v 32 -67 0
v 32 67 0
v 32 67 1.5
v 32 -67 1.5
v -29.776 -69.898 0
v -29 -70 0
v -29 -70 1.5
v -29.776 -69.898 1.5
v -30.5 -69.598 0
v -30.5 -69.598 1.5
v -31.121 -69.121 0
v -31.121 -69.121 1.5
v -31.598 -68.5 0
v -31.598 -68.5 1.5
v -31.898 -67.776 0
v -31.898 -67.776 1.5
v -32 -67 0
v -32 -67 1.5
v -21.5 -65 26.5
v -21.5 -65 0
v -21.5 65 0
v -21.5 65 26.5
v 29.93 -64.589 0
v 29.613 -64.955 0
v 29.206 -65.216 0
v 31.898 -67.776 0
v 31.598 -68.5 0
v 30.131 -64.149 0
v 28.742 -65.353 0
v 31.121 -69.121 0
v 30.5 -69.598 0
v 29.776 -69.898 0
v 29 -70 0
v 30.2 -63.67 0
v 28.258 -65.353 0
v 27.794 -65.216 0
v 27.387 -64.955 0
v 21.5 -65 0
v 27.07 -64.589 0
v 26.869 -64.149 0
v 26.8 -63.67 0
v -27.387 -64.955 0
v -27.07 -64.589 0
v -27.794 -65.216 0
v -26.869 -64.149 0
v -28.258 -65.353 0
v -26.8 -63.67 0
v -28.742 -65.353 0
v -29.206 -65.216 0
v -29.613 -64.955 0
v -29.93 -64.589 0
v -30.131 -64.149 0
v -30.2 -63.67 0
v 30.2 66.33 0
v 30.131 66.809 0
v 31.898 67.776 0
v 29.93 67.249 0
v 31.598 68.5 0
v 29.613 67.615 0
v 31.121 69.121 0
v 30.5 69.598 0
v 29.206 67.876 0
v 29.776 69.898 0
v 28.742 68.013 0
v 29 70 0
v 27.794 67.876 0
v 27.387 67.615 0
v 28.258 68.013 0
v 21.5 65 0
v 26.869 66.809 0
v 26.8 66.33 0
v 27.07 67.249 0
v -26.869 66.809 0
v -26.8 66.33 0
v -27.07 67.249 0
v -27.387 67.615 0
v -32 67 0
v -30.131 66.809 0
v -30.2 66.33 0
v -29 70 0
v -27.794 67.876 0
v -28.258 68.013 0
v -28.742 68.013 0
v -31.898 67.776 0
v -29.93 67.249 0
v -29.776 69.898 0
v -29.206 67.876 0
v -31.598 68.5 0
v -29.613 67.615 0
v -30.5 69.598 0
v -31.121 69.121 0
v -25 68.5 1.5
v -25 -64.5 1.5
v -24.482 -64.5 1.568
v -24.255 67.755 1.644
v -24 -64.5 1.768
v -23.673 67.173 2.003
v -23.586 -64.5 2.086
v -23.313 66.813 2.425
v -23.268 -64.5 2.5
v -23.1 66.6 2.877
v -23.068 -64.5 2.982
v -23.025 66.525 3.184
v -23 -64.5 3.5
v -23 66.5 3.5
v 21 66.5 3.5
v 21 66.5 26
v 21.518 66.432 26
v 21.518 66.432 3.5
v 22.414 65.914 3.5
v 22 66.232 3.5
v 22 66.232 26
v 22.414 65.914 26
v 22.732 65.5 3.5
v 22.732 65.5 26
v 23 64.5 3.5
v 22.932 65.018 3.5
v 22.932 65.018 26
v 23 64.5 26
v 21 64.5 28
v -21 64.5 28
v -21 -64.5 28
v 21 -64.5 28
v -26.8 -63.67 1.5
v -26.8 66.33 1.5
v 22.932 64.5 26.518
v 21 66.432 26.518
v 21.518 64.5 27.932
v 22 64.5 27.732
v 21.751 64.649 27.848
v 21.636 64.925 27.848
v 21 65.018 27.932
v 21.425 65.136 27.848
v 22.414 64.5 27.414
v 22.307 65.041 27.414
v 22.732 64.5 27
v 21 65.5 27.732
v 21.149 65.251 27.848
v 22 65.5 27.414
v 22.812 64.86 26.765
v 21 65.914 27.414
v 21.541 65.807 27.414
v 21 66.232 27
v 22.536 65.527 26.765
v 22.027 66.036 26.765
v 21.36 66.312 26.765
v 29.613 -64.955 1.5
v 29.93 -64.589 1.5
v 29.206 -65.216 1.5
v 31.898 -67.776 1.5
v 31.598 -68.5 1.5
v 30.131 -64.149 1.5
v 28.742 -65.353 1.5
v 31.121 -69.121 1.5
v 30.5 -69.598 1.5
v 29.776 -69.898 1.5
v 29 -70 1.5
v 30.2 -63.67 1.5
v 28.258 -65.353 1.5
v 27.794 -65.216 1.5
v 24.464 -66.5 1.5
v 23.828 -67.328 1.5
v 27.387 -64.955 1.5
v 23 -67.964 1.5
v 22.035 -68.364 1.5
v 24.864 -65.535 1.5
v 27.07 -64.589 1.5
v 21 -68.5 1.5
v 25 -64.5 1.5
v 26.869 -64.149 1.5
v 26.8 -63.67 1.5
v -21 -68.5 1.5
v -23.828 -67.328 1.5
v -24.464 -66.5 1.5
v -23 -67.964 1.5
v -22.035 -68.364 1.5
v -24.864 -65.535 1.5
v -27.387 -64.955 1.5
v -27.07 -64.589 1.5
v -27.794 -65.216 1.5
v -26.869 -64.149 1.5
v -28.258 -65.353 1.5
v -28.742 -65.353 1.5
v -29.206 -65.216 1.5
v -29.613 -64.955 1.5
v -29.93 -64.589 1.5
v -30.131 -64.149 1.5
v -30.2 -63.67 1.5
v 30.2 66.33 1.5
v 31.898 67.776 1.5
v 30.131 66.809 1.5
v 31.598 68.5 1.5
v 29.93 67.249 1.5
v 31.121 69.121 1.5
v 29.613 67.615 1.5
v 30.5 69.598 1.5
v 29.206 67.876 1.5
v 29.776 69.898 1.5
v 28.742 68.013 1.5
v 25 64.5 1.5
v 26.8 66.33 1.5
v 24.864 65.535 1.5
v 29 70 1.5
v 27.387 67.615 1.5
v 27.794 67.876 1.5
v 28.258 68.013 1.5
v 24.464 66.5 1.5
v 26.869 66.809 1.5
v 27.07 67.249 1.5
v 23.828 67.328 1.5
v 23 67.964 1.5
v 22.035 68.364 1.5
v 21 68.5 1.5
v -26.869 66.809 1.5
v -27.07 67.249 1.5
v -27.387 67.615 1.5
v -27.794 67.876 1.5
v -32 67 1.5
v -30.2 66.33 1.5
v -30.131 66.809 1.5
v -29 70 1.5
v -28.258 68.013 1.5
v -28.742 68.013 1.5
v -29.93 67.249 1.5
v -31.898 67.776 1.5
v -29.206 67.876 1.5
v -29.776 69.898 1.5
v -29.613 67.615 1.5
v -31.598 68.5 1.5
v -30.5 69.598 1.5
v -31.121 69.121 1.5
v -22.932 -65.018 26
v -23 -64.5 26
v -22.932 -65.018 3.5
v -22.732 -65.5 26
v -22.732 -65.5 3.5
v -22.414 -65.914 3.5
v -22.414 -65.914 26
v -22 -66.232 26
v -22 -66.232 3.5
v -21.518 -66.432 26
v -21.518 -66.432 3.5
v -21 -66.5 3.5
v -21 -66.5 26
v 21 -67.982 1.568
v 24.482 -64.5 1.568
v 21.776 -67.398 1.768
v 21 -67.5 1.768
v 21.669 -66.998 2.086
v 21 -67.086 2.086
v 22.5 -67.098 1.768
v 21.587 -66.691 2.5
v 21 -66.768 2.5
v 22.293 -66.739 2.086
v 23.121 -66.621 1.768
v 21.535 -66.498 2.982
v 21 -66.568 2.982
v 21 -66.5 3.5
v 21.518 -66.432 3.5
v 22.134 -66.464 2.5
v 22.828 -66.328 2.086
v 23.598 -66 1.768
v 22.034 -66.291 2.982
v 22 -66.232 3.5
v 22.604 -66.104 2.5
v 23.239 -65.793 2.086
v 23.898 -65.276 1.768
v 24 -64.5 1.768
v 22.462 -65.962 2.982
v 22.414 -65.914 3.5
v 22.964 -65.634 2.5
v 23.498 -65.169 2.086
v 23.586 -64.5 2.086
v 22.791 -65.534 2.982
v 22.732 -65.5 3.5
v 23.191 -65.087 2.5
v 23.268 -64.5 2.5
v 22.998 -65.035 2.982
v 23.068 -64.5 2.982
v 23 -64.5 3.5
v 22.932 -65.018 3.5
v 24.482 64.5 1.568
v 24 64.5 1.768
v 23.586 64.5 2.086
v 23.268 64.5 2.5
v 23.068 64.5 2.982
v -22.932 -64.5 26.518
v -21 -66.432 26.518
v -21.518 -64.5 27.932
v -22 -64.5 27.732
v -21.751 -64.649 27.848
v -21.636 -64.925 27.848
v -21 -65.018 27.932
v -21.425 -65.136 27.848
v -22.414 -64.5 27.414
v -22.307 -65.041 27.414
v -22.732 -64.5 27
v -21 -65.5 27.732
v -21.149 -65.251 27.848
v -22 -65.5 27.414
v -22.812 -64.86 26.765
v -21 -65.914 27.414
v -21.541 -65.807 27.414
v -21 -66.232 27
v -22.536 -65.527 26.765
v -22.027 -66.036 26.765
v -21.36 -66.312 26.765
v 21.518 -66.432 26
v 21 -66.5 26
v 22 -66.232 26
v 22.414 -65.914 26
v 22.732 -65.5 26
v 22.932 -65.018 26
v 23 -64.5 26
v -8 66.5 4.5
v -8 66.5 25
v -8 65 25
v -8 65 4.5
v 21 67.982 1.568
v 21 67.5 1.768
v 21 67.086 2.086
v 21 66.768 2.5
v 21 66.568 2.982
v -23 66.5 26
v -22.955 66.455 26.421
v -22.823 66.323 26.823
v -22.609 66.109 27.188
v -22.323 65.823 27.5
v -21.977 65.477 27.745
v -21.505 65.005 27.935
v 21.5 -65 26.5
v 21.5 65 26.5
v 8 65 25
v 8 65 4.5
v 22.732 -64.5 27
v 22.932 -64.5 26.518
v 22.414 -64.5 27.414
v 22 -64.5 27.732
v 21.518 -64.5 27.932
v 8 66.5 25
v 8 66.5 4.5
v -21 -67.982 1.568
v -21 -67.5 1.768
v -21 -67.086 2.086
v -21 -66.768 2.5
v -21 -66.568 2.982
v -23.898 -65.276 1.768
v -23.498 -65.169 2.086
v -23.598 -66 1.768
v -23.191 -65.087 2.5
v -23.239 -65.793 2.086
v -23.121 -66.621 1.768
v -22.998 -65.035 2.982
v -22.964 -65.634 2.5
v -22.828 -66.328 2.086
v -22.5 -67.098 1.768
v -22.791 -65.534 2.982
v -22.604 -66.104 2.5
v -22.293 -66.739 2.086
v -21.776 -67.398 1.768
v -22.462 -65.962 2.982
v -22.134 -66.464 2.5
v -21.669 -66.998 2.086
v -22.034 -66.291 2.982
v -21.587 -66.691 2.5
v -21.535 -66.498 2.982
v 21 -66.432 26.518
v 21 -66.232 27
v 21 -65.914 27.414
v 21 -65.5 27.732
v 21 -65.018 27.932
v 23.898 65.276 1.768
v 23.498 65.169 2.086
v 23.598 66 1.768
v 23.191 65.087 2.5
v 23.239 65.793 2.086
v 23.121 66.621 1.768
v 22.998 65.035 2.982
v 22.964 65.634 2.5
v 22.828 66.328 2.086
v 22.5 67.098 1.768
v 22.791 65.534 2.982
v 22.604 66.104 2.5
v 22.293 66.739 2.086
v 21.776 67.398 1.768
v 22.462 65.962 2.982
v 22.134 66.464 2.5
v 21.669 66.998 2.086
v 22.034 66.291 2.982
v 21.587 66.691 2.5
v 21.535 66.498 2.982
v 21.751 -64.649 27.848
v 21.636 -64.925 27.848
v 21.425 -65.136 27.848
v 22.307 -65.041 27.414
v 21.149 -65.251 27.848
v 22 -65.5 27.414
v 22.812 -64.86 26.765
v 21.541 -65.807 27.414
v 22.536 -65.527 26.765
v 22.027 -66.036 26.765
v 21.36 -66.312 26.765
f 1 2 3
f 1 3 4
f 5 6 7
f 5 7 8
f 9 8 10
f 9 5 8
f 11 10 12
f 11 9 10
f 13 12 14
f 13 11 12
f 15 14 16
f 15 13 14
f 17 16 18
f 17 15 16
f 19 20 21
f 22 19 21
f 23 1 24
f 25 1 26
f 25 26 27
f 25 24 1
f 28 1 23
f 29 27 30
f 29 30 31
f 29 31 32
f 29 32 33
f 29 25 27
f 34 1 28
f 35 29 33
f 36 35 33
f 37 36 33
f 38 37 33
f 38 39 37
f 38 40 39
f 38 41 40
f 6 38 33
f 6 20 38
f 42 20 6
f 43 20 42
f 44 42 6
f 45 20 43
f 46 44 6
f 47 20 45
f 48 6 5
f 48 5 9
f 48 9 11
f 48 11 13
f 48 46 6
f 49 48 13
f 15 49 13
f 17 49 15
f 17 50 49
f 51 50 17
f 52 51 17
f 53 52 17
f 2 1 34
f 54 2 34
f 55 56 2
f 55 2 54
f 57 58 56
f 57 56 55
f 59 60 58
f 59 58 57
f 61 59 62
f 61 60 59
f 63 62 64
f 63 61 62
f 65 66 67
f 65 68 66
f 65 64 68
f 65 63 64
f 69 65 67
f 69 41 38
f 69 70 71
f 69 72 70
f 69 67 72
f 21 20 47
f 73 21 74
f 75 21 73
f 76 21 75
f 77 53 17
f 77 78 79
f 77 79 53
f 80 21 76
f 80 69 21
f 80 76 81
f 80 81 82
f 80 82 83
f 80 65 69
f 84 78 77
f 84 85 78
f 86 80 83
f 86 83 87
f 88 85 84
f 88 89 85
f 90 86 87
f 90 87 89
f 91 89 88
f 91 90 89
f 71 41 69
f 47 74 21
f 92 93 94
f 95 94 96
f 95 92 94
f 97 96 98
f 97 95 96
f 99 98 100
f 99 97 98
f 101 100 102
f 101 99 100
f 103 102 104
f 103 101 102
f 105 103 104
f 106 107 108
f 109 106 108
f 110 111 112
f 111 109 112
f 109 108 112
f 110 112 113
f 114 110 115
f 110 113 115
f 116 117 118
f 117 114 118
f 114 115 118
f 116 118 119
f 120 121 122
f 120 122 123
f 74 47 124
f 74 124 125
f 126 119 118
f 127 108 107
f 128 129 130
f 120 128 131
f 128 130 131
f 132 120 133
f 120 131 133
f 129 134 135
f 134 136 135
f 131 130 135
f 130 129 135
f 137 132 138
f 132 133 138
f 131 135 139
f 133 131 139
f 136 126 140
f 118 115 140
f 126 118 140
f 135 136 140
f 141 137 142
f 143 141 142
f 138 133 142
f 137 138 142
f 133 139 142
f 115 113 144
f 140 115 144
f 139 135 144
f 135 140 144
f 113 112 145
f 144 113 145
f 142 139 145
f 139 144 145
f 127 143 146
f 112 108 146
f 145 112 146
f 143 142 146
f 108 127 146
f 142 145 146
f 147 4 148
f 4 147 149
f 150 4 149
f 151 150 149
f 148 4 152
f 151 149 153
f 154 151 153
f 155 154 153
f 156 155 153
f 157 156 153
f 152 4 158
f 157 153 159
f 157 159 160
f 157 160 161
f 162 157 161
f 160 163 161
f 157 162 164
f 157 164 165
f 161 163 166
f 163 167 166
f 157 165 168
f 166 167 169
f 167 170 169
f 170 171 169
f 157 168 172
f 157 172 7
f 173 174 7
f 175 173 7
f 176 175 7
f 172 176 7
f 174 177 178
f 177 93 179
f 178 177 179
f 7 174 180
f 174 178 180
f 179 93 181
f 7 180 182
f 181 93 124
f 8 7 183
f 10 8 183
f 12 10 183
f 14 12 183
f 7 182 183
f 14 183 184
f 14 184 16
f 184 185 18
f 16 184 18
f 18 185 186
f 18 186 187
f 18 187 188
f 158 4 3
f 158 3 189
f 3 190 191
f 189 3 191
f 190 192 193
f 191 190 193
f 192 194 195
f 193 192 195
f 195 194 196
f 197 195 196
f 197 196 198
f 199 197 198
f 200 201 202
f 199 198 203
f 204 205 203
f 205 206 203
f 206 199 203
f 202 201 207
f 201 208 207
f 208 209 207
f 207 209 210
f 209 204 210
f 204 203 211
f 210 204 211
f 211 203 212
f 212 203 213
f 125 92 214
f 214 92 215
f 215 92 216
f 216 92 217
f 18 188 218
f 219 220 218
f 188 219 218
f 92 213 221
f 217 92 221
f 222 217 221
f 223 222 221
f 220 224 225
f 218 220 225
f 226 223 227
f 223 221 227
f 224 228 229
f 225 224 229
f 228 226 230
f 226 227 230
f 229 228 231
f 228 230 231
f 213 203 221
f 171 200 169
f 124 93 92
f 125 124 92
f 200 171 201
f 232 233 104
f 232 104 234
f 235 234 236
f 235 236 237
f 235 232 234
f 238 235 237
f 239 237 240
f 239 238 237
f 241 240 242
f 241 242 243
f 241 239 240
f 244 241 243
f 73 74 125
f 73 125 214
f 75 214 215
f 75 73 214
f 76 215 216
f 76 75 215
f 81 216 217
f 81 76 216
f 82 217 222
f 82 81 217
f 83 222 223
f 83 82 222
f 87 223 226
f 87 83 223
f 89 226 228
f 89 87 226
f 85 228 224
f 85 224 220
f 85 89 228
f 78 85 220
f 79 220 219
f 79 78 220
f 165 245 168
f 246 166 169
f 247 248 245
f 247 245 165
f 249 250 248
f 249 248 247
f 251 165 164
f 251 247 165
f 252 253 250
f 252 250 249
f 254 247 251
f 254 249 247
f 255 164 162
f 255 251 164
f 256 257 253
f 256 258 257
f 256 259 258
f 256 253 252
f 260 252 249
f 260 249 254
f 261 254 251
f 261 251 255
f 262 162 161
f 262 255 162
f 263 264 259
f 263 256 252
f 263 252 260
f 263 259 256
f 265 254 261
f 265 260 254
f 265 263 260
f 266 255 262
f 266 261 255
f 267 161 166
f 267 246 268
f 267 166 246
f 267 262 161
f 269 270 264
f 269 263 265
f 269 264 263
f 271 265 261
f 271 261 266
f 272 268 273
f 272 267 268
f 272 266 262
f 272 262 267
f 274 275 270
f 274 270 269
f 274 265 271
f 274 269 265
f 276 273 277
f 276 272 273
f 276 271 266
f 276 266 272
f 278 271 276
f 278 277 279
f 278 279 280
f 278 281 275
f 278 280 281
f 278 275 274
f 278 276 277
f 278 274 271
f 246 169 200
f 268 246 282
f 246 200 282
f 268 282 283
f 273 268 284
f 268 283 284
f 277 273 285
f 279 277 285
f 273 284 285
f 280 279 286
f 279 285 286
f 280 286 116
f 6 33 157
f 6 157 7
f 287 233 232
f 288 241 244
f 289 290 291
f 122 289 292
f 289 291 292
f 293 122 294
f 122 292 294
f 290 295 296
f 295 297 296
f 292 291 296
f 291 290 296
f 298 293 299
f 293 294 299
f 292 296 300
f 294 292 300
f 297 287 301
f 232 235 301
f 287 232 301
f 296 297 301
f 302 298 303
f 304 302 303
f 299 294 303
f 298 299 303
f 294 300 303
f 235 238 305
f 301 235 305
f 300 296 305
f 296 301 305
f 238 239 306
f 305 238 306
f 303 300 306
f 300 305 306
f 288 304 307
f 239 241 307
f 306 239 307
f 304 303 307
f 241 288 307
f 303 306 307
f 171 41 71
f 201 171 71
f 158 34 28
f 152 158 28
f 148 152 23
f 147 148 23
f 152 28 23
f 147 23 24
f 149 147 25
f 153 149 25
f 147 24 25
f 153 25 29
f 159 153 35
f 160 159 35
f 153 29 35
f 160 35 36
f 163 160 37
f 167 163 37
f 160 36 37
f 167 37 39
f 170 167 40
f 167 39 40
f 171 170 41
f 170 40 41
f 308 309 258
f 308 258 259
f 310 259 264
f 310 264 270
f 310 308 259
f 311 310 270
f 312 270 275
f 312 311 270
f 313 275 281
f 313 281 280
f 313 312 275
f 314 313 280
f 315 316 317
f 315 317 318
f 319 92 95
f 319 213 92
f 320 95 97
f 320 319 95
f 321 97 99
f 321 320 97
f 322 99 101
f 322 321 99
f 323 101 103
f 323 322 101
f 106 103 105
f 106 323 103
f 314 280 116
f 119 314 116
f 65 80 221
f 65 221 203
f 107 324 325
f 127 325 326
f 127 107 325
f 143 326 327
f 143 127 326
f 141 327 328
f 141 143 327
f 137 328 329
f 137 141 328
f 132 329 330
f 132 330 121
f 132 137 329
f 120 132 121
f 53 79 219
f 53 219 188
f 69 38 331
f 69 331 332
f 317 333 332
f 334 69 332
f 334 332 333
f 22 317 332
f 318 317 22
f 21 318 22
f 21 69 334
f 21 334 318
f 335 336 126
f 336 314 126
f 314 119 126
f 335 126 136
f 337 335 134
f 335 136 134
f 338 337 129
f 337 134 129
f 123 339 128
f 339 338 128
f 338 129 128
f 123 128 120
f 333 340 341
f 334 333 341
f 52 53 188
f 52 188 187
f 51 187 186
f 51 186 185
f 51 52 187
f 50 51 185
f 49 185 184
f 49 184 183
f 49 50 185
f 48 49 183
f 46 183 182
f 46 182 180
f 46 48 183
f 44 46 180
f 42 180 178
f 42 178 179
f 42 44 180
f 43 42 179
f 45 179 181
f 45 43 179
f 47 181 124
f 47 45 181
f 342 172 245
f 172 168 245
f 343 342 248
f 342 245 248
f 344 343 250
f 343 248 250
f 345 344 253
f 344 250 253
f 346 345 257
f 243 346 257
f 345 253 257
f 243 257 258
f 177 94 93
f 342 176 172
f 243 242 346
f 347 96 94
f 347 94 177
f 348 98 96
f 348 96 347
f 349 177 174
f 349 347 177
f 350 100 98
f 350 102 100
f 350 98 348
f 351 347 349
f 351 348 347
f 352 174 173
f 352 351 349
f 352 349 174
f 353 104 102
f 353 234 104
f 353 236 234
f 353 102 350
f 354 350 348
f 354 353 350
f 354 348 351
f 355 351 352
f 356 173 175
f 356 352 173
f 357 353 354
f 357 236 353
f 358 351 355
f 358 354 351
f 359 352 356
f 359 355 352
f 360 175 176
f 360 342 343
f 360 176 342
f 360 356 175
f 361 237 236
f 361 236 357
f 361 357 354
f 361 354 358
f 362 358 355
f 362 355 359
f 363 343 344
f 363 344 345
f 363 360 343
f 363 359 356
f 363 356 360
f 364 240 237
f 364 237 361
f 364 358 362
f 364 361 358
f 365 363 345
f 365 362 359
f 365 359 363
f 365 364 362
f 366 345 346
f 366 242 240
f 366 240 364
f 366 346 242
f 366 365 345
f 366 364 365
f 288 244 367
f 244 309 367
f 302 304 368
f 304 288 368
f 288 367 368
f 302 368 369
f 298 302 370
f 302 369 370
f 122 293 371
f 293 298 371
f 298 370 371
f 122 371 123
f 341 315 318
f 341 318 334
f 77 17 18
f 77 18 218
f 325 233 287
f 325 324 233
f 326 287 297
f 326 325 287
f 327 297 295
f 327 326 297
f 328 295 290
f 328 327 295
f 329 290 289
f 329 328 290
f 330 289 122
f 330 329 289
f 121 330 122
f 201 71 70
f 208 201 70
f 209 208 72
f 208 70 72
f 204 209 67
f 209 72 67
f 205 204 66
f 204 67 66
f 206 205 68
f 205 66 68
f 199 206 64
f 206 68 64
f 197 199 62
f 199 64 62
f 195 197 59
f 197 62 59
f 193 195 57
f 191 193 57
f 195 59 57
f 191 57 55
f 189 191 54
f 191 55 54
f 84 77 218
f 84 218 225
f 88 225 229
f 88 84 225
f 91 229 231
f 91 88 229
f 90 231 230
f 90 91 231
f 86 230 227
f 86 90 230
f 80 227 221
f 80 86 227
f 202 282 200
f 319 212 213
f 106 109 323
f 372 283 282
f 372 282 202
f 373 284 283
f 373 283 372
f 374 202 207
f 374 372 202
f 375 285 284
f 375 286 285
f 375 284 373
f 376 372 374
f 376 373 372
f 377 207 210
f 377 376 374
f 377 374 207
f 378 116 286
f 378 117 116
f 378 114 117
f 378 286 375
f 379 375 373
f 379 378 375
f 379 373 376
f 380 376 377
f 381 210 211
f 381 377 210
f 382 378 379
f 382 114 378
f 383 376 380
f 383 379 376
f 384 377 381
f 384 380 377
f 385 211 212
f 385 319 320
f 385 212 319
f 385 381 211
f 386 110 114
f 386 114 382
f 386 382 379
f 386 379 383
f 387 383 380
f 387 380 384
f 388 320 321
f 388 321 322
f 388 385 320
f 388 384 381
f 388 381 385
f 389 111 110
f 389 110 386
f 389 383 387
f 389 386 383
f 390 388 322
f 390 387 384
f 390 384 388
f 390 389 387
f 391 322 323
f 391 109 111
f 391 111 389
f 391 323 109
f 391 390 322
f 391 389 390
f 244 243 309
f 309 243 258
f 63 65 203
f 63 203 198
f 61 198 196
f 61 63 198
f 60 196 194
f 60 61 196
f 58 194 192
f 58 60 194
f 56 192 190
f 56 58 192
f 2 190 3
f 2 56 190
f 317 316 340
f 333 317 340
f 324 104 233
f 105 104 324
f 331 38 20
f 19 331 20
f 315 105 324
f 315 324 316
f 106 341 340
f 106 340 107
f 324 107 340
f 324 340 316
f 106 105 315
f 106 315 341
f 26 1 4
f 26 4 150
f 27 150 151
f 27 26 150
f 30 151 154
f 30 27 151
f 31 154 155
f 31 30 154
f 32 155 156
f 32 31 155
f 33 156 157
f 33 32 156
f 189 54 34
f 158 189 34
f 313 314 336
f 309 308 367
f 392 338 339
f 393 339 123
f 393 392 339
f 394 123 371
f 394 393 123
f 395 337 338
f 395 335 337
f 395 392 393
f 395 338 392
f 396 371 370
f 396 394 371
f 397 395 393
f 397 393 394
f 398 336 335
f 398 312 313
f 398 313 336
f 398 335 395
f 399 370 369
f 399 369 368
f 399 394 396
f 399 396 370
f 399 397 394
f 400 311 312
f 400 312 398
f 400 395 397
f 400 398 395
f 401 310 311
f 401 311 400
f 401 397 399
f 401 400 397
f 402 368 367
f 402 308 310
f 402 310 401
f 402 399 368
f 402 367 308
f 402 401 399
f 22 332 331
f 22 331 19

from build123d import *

# Parameters (mm, degrees)
BOSS_EXTRUDE1_DEPTH = 1.5
SKETCH2_W           = 46
SKETCH2_H           = 133
BOSS_EXTRUDE2_DEPTH = 26.5
SKETCH3_W           = 43
SKETCH3_H           = 130
CUT_EXTRUDE1_DEPTH  = 26.5
CUT_EXTRUDE2_DEPTH  = 1.5
SKETCH5_W           = 16
SKETCH5_H           = 20.5
CUT_EXTRUDE3_DEPTH  = 1.5
FILLET1_R           = 2


with BuildPart() as part:
    # Sketch1 → Boss-Extrude1 (new body)
    with BuildSketch(Plane.XY):
        with BuildLine():
            Line((-29, 70), (29, 70))
            ThreePointArc((29, 70), (31.121320344, 69.121320344), (32, 67))
            Line((32, 67), (32, -67))
            ThreePointArc((32, -67), (31.121320344, -69.121320344), (29, -70))
            Line((29, -70), (-29, -70))
            ThreePointArc((-29, -70), (-31.121320344, -69.121320344), (-32, -67))
            Line((-32, -67), (-32, 67))
            ThreePointArc((-32, 67), (-31.121320344, 69.121320344), (-29, 70))
        make_face()
    extrude(amount=BOSS_EXTRUDE1_DEPTH)

    # Sketch2 → Boss-Extrude2 (add)
    with BuildSketch(Plane.XY.offset(1.5)):
        Rectangle(SKETCH2_W, SKETCH2_H)
    extrude(amount=BOSS_EXTRUDE2_DEPTH)

    # Sketch3 → Cut-Extrude1 (cut)
    with BuildSketch(Plane(origin=(0, 0, 0), x_dir=(-1, 0, 0), z_dir=(0, 0, -1))):
        Rectangle(SKETCH3_W, SKETCH3_H)
    extrude(amount=-CUT_EXTRUDE1_DEPTH, mode=Mode.SUBTRACT)

    # Sketch4 → Cut-Extrude2 (cut)
    with BuildSketch(Plane(origin=(0, 0, 0), x_dir=(-1, 0, 0), z_dir=(0, 0, -1))):
        with BuildLine():
            Line((-30.2, 66.330000504), (-30.2, -63.669999496))
            ThreePointArc((-30.2, -63.669999496), (-28.5, -65.369999496), (-26.8, -63.669999496))
            Line((-26.8, -63.669999496), (-26.8, 66.330000504))
            ThreePointArc((-26.8, 66.330000504), (-28.5, 68.030000504), (-30.2, 66.330000504))
        make_face()
        with BuildLine():
            Line((30.2, 66.330000504), (30.2, -63.669999496))
            ThreePointArc((30.2, -63.669999496), (28.5, -65.369999496), (26.8, -63.669999496))
            Line((26.8, -63.669999496), (26.8, 66.330000504))
            ThreePointArc((26.8, 66.330000504), (28.5, 68.030000504), (30.2, 66.330000504))
        make_face()
    extrude(amount=-CUT_EXTRUDE2_DEPTH, mode=Mode.SUBTRACT)

    # Sketch5 → Cut-Extrude3 (cut)
    with BuildSketch(Plane(origin=(0, 66.5, 0), x_dir=(1, 0, 0), z_dir=(0, 1, 0))):
        with Locations((0, -14.75)):
            Rectangle(SKETCH5_W, SKETCH5_H)
    extrude(amount=-CUT_EXTRUDE3_DEPTH, mode=Mode.SUBTRACT)

    # Fillet1
    fillet1_edges = [part.edges().sort_by_distance(p)[0] for p in [
        (23, 0, 1.5),
        (23, -66.5, 14.75),
        (0, 66.5, 1.5),
        (23, 66.5, 14.75),
        (-23, 0, 1.5),
        (0, -66.5, 1.5),
        (-23, -66.5, 14.75),
        (23, 0, 28),
        (0, 66.5, 28),
        (-23, 0, 28),
        (0, -66.5, 28),
    ]]
    fillet(fillet1_edges, radius=FILLET1_R)


solid = part.part
